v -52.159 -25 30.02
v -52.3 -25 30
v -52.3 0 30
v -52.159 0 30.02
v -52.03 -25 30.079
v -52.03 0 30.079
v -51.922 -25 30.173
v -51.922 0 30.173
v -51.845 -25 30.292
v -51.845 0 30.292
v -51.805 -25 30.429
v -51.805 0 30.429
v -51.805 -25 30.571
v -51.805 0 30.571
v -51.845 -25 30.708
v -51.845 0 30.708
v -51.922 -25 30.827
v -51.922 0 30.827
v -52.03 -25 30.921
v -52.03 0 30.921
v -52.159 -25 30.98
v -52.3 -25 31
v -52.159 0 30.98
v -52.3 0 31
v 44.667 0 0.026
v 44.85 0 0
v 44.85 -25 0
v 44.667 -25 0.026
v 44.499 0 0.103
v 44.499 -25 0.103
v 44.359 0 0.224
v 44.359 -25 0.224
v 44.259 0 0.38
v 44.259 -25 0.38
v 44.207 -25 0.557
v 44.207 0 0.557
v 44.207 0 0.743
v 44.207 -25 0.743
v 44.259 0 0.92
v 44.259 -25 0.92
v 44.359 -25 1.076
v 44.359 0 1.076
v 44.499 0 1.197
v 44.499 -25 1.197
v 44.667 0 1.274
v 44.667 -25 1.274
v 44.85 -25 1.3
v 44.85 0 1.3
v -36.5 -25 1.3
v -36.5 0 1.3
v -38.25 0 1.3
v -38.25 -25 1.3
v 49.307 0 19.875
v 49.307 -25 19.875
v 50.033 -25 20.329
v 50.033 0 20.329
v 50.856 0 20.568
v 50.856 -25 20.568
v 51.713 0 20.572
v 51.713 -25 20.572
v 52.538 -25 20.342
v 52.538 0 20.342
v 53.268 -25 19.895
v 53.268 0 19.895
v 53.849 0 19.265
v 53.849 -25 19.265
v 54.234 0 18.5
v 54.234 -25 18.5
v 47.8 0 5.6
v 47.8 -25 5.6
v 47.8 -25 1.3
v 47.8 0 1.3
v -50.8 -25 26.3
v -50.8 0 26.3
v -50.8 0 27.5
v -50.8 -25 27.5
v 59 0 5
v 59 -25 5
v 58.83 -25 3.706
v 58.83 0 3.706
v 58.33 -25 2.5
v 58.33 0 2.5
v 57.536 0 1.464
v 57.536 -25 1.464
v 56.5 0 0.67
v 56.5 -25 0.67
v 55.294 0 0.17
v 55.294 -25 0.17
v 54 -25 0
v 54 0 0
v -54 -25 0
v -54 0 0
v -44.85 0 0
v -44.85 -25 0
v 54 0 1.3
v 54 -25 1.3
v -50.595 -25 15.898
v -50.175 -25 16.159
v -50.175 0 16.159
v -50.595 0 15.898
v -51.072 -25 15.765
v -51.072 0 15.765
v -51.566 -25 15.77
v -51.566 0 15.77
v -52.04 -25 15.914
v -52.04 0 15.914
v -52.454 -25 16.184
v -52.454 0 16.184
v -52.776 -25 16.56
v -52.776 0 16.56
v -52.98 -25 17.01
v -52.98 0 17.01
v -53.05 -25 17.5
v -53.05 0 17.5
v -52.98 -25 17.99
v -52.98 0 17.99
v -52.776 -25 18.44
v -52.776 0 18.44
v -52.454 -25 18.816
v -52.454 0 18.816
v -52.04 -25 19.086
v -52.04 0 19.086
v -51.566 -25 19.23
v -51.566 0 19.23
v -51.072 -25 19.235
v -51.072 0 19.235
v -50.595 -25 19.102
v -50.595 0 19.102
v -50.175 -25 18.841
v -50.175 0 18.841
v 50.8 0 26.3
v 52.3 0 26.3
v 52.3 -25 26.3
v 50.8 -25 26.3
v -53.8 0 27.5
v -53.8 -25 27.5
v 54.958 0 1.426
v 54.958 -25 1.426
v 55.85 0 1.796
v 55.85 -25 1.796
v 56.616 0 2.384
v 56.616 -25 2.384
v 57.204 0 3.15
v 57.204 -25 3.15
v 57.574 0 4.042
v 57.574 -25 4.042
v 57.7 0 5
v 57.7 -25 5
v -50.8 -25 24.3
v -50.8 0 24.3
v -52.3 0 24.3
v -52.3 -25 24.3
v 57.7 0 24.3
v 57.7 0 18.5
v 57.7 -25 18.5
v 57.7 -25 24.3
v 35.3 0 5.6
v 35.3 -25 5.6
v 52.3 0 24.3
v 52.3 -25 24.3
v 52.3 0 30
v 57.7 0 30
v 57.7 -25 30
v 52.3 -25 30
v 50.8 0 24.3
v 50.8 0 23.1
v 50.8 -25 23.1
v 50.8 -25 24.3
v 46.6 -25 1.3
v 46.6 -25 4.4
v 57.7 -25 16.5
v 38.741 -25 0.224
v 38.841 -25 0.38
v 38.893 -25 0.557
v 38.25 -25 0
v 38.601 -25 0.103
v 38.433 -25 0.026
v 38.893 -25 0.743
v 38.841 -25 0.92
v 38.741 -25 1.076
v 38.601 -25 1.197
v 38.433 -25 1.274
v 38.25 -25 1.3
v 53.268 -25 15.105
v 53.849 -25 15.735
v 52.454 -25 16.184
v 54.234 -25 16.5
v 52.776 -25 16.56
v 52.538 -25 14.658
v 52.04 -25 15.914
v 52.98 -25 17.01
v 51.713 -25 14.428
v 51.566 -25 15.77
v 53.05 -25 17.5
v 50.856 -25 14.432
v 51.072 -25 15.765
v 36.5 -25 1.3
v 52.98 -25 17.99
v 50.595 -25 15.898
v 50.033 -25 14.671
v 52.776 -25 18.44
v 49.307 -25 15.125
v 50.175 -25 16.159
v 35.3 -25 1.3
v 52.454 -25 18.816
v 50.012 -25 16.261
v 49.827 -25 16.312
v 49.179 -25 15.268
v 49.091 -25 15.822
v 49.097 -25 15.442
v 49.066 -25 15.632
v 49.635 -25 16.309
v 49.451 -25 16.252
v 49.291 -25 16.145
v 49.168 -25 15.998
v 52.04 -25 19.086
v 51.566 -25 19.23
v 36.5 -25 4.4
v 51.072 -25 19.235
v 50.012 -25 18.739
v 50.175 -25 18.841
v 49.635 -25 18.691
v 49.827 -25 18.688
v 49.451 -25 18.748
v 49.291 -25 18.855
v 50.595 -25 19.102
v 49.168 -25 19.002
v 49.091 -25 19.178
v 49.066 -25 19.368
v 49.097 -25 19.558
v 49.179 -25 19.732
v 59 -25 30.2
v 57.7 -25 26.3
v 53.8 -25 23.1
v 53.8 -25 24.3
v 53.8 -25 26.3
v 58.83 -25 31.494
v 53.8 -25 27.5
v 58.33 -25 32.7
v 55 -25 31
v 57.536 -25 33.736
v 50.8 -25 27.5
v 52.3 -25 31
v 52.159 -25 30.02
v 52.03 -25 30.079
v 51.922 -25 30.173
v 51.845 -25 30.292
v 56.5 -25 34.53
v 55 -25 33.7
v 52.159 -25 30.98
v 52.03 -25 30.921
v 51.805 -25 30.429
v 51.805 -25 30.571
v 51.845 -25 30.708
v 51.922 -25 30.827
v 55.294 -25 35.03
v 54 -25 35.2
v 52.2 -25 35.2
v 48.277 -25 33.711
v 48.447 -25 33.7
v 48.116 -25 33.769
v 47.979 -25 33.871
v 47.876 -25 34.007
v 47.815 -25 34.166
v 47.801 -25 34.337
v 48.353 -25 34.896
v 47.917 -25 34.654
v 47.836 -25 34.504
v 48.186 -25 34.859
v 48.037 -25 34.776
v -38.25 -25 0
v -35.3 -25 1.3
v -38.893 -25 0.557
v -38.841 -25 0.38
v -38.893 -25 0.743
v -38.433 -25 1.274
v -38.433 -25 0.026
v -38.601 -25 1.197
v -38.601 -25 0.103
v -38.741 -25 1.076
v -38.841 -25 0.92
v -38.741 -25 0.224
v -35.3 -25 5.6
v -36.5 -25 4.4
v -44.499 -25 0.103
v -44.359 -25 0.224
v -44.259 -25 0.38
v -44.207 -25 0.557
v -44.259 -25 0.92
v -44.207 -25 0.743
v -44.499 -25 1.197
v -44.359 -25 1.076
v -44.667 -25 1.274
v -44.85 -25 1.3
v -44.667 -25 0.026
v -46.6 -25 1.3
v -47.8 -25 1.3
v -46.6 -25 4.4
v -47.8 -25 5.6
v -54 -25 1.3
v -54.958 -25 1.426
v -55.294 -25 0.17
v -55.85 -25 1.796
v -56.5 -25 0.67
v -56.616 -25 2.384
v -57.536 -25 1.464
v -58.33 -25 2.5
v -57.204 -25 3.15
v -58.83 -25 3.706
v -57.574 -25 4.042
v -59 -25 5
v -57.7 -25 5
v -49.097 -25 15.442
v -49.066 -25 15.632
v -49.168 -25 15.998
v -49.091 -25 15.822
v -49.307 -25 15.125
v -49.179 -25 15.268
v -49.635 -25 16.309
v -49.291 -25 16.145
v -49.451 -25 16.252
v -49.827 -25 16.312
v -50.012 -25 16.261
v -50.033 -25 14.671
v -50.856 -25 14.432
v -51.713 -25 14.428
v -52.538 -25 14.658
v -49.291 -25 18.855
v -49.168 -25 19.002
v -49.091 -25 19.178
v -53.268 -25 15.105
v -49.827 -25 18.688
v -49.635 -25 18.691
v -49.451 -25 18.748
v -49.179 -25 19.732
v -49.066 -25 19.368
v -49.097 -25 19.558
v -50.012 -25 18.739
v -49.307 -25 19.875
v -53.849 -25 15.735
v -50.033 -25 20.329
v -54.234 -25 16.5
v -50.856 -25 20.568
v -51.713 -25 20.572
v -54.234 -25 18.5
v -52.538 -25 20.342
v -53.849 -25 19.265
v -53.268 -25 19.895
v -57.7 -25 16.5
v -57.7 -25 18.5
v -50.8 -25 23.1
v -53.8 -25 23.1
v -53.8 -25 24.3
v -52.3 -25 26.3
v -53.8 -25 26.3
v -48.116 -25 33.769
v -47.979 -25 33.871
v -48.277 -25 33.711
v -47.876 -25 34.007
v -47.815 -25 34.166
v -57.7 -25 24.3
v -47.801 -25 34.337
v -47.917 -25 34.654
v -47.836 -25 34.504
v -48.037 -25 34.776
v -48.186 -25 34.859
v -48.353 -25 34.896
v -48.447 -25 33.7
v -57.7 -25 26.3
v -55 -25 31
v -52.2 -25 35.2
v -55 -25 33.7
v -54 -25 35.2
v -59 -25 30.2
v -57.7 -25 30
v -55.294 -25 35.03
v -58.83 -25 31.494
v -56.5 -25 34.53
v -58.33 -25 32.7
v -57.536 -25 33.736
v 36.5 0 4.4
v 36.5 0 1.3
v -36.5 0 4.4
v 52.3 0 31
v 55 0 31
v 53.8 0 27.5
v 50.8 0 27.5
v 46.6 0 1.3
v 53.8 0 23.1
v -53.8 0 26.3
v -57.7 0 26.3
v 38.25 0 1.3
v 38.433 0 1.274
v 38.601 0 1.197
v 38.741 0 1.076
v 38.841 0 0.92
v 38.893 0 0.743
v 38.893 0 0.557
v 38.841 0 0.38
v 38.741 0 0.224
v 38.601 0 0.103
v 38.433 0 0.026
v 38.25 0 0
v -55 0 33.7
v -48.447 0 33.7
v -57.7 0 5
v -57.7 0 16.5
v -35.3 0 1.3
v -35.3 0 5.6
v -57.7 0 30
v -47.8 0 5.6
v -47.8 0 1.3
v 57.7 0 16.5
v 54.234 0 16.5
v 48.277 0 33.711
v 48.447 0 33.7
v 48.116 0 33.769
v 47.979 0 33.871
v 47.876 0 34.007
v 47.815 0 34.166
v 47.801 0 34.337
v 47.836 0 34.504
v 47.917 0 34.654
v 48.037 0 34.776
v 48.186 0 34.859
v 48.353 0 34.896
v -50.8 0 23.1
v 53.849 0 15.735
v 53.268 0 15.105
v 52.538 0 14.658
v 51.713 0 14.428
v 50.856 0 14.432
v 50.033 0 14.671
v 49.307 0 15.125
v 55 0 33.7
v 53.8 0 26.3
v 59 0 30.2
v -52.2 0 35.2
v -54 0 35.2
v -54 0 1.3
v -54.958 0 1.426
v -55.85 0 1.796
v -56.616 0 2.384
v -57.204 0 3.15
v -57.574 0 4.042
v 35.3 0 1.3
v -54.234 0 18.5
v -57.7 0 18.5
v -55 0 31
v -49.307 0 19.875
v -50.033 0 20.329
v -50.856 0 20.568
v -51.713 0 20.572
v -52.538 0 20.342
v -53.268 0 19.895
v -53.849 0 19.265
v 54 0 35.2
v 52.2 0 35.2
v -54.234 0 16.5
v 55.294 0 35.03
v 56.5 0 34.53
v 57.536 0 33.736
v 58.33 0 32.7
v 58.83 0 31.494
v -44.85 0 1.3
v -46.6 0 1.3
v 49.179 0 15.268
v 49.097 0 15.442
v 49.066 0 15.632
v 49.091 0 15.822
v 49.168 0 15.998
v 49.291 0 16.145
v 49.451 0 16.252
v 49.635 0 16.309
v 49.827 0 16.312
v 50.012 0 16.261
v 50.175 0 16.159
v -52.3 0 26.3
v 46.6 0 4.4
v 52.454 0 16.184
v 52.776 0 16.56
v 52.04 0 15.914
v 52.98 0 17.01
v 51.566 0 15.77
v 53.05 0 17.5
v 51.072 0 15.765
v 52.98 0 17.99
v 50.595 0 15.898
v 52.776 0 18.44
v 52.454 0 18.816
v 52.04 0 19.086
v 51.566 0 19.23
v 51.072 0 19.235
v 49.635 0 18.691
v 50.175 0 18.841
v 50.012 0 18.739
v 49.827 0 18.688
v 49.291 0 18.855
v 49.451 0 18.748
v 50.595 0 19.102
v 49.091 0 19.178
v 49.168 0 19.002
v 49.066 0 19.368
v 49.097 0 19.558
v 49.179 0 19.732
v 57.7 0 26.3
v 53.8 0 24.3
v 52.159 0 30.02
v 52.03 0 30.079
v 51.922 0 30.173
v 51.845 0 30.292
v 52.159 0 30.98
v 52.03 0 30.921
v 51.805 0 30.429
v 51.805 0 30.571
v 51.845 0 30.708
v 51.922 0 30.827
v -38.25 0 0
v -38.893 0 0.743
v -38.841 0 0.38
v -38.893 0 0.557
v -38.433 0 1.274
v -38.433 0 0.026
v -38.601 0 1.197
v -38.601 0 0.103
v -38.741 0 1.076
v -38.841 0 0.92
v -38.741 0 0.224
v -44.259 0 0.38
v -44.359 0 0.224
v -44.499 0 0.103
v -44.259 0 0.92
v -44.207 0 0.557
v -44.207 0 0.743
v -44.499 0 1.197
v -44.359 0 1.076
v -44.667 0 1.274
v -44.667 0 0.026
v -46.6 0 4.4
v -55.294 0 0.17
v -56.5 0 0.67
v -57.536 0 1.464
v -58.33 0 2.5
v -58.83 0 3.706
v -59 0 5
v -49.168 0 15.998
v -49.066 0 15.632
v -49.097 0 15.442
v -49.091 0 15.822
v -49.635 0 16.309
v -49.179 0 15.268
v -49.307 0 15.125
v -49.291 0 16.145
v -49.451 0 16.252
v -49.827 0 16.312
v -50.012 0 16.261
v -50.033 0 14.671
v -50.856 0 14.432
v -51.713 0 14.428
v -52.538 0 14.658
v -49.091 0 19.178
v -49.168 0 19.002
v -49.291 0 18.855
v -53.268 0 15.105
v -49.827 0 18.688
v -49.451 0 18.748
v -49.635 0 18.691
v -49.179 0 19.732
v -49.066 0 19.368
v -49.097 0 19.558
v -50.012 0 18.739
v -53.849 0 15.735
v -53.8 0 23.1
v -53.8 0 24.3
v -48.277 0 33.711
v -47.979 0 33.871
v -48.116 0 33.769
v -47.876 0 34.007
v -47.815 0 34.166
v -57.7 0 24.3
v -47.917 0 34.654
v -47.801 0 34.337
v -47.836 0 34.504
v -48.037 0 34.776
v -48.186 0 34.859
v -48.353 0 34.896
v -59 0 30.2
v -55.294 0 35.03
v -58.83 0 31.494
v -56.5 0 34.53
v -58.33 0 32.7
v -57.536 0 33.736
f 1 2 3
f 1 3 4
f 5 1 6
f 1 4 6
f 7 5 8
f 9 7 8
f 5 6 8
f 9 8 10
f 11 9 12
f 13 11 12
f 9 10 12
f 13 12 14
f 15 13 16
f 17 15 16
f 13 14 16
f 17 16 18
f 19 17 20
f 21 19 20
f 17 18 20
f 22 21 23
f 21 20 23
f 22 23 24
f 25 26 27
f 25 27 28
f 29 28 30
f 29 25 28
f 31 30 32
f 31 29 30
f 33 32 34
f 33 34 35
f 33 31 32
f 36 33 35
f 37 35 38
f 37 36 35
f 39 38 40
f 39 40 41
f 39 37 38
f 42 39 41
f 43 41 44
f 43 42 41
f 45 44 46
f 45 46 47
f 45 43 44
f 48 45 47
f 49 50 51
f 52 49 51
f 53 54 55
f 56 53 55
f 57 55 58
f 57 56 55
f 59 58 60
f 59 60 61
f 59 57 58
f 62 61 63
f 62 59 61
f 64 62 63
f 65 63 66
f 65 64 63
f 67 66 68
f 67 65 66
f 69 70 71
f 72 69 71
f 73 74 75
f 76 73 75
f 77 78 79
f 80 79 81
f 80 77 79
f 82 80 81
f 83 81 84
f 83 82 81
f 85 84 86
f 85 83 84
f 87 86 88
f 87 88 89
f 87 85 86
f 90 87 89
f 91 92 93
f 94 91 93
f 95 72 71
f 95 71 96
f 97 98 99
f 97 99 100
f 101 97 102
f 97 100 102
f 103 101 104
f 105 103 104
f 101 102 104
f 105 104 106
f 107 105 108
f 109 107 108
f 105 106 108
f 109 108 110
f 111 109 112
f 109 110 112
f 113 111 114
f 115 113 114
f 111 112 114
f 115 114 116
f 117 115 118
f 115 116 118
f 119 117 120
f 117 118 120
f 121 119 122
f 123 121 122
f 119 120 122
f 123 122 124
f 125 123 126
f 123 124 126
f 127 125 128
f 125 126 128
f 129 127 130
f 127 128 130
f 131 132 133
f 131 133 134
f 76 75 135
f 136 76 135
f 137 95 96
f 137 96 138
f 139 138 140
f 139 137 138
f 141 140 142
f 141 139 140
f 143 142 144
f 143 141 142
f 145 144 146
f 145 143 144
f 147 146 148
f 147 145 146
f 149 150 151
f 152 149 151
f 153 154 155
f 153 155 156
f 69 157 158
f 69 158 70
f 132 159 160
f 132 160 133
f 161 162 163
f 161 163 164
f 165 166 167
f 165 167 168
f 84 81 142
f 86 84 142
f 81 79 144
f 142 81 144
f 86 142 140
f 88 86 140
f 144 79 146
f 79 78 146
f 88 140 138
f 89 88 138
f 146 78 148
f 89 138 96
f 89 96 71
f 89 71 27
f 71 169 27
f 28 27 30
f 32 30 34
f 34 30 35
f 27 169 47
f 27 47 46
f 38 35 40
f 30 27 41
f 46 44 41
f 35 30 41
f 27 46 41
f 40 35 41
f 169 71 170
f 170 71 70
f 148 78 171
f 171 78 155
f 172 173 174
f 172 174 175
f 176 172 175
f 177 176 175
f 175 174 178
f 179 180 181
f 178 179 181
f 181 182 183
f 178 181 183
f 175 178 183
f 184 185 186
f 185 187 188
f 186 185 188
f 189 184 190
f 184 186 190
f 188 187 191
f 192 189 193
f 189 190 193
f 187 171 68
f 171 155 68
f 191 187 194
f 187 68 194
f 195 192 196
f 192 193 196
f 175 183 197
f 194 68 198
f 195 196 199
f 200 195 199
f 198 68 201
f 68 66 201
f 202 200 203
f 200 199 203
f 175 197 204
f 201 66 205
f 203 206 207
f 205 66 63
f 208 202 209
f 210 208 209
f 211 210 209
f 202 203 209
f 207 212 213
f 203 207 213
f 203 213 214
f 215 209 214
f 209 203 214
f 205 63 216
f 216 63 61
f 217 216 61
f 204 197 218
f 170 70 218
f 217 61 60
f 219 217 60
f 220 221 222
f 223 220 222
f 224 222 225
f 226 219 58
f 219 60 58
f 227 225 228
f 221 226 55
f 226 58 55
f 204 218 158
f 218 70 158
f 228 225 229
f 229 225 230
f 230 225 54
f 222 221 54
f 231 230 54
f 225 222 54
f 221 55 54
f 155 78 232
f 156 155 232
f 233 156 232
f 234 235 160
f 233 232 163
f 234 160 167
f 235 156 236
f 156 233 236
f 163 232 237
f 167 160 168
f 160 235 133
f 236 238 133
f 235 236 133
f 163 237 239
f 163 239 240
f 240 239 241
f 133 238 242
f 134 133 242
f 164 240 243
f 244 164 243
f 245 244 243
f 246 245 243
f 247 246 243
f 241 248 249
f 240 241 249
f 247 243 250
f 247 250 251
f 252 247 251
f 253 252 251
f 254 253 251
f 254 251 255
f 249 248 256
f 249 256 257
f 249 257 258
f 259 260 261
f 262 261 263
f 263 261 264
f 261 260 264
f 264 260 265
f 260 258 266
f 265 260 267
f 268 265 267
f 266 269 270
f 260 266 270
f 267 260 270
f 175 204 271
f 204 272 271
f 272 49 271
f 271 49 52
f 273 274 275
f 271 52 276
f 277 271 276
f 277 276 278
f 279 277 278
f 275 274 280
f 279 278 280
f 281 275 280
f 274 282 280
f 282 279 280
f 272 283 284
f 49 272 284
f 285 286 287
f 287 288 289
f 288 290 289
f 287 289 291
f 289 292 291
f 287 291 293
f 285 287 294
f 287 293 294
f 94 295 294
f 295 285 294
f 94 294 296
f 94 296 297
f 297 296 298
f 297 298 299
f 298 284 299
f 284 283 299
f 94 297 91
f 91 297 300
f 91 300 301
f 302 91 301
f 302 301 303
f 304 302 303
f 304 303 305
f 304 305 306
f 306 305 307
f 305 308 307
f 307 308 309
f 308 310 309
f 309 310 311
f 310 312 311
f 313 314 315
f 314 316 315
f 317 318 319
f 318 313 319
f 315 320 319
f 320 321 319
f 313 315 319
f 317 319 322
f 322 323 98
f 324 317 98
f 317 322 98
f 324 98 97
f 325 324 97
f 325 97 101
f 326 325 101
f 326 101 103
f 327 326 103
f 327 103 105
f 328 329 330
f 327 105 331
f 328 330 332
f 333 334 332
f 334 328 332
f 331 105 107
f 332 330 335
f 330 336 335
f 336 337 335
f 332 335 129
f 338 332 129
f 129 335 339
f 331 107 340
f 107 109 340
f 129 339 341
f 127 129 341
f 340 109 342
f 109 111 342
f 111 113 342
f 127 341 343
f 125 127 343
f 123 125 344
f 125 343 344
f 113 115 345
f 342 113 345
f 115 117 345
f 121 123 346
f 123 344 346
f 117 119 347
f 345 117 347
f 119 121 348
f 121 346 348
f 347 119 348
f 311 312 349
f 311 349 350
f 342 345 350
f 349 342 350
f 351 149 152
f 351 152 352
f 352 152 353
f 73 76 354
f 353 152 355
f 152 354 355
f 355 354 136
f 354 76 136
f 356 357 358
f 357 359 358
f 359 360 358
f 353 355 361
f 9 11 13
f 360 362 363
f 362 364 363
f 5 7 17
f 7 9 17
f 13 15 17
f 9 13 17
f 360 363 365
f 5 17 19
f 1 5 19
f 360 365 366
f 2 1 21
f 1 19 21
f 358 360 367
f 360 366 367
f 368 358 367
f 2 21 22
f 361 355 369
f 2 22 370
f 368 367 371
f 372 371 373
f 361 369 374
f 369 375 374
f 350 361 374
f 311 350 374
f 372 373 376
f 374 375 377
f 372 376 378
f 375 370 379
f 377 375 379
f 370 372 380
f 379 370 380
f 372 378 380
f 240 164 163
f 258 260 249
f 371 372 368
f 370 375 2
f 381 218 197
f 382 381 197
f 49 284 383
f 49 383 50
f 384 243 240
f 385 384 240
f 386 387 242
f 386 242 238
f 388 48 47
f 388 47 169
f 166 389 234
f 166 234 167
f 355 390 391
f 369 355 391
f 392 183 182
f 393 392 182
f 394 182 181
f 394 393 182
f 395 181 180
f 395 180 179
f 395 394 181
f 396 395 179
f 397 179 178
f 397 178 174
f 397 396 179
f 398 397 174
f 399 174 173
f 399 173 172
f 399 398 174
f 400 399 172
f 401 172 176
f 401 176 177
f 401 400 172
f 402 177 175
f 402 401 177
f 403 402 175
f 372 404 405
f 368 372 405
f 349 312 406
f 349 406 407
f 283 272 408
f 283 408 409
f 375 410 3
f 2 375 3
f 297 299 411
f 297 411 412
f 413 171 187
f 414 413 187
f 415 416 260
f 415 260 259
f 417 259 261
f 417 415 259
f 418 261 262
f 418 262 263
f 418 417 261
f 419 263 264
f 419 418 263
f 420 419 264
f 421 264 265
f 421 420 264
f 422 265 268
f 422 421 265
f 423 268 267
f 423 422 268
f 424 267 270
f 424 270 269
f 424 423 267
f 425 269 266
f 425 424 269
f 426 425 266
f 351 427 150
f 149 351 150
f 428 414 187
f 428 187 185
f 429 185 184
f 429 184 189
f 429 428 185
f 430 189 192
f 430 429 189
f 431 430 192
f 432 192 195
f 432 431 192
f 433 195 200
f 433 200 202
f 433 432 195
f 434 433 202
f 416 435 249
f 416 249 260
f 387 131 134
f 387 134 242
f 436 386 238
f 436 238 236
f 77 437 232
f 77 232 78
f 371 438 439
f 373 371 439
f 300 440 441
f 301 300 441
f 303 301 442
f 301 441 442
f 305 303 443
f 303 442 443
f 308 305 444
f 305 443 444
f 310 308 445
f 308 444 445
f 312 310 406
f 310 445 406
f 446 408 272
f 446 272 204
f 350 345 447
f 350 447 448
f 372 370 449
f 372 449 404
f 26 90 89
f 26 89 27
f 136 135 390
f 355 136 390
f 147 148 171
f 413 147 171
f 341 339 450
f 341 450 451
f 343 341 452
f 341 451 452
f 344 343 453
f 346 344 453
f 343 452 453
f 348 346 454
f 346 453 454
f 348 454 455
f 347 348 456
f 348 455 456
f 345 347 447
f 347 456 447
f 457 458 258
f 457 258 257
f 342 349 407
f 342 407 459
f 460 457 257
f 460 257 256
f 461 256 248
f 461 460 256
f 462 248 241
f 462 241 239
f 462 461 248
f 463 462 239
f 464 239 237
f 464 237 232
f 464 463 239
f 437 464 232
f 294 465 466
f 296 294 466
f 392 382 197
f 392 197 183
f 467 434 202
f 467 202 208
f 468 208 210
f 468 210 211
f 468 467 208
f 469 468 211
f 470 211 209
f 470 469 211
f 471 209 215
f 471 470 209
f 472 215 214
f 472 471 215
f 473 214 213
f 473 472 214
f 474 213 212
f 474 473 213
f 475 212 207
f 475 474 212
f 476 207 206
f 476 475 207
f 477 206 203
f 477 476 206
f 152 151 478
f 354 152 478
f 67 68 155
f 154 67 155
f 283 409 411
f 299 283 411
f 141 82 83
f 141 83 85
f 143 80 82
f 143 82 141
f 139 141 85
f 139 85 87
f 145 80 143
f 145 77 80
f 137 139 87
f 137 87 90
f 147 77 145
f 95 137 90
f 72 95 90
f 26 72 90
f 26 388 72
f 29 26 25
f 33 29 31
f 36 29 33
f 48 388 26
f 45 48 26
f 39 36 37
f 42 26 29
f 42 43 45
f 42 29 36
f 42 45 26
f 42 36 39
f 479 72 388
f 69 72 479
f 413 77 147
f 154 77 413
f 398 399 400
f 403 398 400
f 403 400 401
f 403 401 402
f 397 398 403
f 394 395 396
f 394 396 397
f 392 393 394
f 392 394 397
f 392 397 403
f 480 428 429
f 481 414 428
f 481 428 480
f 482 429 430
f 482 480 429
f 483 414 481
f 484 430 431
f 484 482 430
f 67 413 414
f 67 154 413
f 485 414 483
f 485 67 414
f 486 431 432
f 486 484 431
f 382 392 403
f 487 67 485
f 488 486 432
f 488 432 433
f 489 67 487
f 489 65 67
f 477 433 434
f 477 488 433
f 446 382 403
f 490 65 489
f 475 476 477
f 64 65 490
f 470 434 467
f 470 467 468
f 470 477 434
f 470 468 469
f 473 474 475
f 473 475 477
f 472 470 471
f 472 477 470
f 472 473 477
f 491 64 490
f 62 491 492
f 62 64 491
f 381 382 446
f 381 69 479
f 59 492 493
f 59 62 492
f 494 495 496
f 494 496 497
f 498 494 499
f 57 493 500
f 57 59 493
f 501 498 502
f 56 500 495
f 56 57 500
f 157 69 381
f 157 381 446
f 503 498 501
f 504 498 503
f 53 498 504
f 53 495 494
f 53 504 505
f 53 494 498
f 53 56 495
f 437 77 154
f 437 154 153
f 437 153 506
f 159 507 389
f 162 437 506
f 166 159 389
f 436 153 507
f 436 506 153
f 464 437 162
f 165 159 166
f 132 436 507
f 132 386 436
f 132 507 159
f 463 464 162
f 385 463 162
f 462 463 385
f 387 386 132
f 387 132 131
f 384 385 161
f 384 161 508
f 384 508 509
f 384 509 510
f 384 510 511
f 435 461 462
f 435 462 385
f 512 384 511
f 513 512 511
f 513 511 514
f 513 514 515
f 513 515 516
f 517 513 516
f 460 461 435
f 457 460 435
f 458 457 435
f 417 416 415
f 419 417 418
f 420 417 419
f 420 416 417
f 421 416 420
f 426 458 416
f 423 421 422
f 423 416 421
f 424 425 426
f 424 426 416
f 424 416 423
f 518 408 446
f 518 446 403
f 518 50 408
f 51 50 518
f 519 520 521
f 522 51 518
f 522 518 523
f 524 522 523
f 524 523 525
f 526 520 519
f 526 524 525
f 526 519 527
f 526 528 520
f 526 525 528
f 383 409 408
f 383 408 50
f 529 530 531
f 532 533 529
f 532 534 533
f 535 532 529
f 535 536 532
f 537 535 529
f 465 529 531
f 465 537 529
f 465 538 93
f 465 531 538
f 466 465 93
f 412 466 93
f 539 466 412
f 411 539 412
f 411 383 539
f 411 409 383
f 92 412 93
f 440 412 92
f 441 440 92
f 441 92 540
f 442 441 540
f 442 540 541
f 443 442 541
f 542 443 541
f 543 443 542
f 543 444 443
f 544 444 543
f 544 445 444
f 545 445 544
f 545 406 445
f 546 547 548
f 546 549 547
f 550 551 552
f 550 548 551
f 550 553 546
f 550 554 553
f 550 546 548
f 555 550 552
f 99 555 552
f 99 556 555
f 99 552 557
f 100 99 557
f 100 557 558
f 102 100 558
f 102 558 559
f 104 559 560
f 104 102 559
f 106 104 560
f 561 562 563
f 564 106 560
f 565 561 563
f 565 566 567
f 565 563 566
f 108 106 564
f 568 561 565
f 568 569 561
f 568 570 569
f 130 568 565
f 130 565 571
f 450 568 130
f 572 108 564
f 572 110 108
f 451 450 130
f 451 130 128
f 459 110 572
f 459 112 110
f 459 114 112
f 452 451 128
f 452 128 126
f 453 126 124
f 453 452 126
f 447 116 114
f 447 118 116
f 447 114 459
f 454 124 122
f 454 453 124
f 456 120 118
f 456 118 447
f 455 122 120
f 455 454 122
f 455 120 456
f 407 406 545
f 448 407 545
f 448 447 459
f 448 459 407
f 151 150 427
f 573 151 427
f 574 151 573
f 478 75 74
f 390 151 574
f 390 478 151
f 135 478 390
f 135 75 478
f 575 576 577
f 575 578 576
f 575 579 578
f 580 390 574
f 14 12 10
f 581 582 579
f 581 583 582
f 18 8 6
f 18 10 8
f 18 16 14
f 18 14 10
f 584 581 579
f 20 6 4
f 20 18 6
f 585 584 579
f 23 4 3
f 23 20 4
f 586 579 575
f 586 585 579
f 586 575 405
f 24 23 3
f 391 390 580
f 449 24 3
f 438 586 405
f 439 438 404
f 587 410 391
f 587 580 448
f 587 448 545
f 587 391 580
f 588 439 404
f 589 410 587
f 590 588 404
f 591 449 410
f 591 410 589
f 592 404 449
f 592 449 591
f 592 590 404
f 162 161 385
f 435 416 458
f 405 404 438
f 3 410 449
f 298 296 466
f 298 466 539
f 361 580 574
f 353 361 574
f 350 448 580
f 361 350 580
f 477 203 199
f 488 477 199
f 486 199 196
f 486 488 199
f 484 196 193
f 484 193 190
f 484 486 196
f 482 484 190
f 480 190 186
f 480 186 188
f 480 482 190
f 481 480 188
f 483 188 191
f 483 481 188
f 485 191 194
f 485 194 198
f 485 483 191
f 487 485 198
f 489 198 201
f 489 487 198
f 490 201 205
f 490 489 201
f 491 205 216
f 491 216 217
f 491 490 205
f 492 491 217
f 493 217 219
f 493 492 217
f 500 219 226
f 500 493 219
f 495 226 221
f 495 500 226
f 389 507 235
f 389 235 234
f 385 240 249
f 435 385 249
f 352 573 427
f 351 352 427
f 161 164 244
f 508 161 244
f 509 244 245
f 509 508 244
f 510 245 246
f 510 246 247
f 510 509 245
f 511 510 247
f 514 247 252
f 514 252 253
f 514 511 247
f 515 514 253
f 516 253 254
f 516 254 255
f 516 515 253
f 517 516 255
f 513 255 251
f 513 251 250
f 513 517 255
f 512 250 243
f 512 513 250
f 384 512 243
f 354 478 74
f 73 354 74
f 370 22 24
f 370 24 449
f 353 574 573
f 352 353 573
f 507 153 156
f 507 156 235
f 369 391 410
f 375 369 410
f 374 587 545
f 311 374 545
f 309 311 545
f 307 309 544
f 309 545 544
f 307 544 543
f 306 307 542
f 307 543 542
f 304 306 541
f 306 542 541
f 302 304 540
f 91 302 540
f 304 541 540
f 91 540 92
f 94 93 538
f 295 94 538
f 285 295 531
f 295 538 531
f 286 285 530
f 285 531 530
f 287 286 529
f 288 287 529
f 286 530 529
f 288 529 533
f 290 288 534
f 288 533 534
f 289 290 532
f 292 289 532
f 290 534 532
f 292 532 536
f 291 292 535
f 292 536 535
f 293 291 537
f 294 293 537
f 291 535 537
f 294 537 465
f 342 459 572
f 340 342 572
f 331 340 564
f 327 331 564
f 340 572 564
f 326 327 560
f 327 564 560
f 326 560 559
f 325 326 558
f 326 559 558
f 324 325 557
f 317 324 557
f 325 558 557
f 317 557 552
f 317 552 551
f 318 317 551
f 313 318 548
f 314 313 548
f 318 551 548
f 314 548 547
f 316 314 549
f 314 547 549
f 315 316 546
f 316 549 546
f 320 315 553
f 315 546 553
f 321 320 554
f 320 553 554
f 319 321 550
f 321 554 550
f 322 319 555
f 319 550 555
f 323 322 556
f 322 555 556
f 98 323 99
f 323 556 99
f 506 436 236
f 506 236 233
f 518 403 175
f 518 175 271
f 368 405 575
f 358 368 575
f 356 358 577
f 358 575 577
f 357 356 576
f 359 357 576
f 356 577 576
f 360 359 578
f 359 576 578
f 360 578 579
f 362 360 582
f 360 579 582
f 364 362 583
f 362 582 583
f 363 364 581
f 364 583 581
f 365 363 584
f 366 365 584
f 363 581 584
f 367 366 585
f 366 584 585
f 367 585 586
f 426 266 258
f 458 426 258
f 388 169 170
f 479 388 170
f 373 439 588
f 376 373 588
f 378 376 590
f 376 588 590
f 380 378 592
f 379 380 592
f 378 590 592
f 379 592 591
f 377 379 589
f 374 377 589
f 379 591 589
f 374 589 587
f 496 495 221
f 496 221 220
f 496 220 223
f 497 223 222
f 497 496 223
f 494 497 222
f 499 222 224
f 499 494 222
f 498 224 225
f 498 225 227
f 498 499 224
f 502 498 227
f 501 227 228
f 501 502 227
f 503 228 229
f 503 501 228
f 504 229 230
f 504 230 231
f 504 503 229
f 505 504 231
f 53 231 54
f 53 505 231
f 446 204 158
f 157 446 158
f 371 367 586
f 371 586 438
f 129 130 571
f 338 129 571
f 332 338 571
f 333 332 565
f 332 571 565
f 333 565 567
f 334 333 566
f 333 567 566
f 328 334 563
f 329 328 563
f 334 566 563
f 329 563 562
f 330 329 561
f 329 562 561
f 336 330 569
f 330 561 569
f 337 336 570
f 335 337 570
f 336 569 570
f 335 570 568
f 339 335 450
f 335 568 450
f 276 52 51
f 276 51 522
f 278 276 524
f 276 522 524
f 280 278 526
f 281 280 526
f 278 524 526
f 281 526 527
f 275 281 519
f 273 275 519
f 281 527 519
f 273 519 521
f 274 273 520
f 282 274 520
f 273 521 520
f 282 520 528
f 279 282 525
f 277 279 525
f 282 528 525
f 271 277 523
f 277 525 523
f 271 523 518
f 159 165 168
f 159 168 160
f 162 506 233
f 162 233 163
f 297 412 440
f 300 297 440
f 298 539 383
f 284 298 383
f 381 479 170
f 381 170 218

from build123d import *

# Parameters (mm, degrees)
F1_DEPTH = 25


with BuildPart() as f1:
    # F0 (on Front) → F1 (new body)
    with BuildSketch(Plane.XZ):
        with BuildLine():
            Line((0, 0), (0, 1.3))
            Line((0, 1.3), (-35.3, 1.3))
            Line((-35.3, 1.3), (-35.3, 5.6))
            Line((-35.3, 5.6), (-47.8, 5.6))
            Line((-47.8, 5.6), (-47.8, 1.3))
            Line((-47.8, 1.3), (-54, 1.3))
            ThreePointArc((-54, 1.3), (-56.616295, 2.383705), (-57.7, 5))
            Line((-57.7, 5), (-57.7, 16.5))
            Line((-57.7, 16.5), (-54.23428, 16.5))
            ThreePointArc((-54.23428, 16.5), (-52.133155, 14.514057), (-49.307358, 15.125262))
            ThreePointArc((-49.307358, 15.125262), (-49.22416, 16.076224), (-50.175122, 16.159422))
            ThreePointArc((-50.175122, 16.159422), (-53.05, 17.5), (-50.175122, 18.840578))
            ThreePointArc((-50.175122, 18.840578), (-49.22416, 18.923776), (-49.307358, 19.874738))
            ThreePointArc((-49.307358, 19.874738), (-52.133155, 20.485943), (-54.23428, 18.5))
            Line((-54.23428, 18.5), (-57.7, 18.5))
            Line((-57.7, 18.5), (-57.7, 24.3))
            Line((-57.7, 24.3), (-53.8, 24.3))
            Line((-53.8, 24.3), (-53.8, 23.1))
            Line((-53.8, 23.1), (-50.8, 23.1))
            Line((-50.8, 23.1), (-50.8, 24.3))
            Line((-50.8, 24.3), (-52.3, 24.3))
            Line((-52.3, 24.3), (-52.3, 26.3))
            Line((-52.3, 26.3), (-50.8, 26.3))
            Line((-50.8, 26.3), (-50.8, 27.5))
            Line((-50.8, 27.5), (-53.8, 27.5))
            Line((-53.8, 27.5), (-53.8, 26.3))
            Line((-53.8, 26.3), (-57.7, 26.3))
            Line((-57.7, 26.3), (-57.7, 30))
            Line((-57.7, 30), (-52.3, 30))
            ThreePointArc((-52.3, 30), (-51.8, 30.5), (-52.3, 31))
            Line((-52.3, 31), (-55, 31))
            Line((-55, 31), (-55, 33.7))
            Line((-55, 33.7), (-48.447221, 33.7))
            ThreePointArc((-48.447221, 33.7), (-47.801861, 34.250918), (-48.352779, 34.896278))
            Line((-48.352779, 34.896278), (-52.2, 35.2))
            Line((-52.2, 35.2), (-54, 35.2))
            ThreePointArc((-54, 35.2), (-57.535534, 33.735534), (-59, 30.2))
            Line((-59, 30.2), (-59, 5))
            ThreePointArc((-59, 5), (-57.535534, 1.464466), (-54, 0))
            Line((-54, 0), (-44.85, 0))
            ThreePointArc((-44.85, 0), (-44.2, 0.65), (-44.85, 1.3))
            Line((-44.85, 1.3), (-46.6, 1.3))
            Line((-46.6, 1.3), (-46.6, 4.4))
            Line((-46.6, 4.4), (-36.5, 4.4))
            Line((-36.5, 4.4), (-36.5, 1.3))
            Line((-36.5, 1.3), (-38.25, 1.3))
            ThreePointArc((-38.25, 1.3), (-38.9, 0.65), (-38.25, 0))
            Line((-38.25, 0), (0, 0))
        make_face()
    extrude(amount=F1_DEPTH)

    # F2: F1 across plane


with BuildPart() as f1_1:
    add(f1.part)
    add(f1.part.mirror(Plane.YZ))


solid = f1_1.part
